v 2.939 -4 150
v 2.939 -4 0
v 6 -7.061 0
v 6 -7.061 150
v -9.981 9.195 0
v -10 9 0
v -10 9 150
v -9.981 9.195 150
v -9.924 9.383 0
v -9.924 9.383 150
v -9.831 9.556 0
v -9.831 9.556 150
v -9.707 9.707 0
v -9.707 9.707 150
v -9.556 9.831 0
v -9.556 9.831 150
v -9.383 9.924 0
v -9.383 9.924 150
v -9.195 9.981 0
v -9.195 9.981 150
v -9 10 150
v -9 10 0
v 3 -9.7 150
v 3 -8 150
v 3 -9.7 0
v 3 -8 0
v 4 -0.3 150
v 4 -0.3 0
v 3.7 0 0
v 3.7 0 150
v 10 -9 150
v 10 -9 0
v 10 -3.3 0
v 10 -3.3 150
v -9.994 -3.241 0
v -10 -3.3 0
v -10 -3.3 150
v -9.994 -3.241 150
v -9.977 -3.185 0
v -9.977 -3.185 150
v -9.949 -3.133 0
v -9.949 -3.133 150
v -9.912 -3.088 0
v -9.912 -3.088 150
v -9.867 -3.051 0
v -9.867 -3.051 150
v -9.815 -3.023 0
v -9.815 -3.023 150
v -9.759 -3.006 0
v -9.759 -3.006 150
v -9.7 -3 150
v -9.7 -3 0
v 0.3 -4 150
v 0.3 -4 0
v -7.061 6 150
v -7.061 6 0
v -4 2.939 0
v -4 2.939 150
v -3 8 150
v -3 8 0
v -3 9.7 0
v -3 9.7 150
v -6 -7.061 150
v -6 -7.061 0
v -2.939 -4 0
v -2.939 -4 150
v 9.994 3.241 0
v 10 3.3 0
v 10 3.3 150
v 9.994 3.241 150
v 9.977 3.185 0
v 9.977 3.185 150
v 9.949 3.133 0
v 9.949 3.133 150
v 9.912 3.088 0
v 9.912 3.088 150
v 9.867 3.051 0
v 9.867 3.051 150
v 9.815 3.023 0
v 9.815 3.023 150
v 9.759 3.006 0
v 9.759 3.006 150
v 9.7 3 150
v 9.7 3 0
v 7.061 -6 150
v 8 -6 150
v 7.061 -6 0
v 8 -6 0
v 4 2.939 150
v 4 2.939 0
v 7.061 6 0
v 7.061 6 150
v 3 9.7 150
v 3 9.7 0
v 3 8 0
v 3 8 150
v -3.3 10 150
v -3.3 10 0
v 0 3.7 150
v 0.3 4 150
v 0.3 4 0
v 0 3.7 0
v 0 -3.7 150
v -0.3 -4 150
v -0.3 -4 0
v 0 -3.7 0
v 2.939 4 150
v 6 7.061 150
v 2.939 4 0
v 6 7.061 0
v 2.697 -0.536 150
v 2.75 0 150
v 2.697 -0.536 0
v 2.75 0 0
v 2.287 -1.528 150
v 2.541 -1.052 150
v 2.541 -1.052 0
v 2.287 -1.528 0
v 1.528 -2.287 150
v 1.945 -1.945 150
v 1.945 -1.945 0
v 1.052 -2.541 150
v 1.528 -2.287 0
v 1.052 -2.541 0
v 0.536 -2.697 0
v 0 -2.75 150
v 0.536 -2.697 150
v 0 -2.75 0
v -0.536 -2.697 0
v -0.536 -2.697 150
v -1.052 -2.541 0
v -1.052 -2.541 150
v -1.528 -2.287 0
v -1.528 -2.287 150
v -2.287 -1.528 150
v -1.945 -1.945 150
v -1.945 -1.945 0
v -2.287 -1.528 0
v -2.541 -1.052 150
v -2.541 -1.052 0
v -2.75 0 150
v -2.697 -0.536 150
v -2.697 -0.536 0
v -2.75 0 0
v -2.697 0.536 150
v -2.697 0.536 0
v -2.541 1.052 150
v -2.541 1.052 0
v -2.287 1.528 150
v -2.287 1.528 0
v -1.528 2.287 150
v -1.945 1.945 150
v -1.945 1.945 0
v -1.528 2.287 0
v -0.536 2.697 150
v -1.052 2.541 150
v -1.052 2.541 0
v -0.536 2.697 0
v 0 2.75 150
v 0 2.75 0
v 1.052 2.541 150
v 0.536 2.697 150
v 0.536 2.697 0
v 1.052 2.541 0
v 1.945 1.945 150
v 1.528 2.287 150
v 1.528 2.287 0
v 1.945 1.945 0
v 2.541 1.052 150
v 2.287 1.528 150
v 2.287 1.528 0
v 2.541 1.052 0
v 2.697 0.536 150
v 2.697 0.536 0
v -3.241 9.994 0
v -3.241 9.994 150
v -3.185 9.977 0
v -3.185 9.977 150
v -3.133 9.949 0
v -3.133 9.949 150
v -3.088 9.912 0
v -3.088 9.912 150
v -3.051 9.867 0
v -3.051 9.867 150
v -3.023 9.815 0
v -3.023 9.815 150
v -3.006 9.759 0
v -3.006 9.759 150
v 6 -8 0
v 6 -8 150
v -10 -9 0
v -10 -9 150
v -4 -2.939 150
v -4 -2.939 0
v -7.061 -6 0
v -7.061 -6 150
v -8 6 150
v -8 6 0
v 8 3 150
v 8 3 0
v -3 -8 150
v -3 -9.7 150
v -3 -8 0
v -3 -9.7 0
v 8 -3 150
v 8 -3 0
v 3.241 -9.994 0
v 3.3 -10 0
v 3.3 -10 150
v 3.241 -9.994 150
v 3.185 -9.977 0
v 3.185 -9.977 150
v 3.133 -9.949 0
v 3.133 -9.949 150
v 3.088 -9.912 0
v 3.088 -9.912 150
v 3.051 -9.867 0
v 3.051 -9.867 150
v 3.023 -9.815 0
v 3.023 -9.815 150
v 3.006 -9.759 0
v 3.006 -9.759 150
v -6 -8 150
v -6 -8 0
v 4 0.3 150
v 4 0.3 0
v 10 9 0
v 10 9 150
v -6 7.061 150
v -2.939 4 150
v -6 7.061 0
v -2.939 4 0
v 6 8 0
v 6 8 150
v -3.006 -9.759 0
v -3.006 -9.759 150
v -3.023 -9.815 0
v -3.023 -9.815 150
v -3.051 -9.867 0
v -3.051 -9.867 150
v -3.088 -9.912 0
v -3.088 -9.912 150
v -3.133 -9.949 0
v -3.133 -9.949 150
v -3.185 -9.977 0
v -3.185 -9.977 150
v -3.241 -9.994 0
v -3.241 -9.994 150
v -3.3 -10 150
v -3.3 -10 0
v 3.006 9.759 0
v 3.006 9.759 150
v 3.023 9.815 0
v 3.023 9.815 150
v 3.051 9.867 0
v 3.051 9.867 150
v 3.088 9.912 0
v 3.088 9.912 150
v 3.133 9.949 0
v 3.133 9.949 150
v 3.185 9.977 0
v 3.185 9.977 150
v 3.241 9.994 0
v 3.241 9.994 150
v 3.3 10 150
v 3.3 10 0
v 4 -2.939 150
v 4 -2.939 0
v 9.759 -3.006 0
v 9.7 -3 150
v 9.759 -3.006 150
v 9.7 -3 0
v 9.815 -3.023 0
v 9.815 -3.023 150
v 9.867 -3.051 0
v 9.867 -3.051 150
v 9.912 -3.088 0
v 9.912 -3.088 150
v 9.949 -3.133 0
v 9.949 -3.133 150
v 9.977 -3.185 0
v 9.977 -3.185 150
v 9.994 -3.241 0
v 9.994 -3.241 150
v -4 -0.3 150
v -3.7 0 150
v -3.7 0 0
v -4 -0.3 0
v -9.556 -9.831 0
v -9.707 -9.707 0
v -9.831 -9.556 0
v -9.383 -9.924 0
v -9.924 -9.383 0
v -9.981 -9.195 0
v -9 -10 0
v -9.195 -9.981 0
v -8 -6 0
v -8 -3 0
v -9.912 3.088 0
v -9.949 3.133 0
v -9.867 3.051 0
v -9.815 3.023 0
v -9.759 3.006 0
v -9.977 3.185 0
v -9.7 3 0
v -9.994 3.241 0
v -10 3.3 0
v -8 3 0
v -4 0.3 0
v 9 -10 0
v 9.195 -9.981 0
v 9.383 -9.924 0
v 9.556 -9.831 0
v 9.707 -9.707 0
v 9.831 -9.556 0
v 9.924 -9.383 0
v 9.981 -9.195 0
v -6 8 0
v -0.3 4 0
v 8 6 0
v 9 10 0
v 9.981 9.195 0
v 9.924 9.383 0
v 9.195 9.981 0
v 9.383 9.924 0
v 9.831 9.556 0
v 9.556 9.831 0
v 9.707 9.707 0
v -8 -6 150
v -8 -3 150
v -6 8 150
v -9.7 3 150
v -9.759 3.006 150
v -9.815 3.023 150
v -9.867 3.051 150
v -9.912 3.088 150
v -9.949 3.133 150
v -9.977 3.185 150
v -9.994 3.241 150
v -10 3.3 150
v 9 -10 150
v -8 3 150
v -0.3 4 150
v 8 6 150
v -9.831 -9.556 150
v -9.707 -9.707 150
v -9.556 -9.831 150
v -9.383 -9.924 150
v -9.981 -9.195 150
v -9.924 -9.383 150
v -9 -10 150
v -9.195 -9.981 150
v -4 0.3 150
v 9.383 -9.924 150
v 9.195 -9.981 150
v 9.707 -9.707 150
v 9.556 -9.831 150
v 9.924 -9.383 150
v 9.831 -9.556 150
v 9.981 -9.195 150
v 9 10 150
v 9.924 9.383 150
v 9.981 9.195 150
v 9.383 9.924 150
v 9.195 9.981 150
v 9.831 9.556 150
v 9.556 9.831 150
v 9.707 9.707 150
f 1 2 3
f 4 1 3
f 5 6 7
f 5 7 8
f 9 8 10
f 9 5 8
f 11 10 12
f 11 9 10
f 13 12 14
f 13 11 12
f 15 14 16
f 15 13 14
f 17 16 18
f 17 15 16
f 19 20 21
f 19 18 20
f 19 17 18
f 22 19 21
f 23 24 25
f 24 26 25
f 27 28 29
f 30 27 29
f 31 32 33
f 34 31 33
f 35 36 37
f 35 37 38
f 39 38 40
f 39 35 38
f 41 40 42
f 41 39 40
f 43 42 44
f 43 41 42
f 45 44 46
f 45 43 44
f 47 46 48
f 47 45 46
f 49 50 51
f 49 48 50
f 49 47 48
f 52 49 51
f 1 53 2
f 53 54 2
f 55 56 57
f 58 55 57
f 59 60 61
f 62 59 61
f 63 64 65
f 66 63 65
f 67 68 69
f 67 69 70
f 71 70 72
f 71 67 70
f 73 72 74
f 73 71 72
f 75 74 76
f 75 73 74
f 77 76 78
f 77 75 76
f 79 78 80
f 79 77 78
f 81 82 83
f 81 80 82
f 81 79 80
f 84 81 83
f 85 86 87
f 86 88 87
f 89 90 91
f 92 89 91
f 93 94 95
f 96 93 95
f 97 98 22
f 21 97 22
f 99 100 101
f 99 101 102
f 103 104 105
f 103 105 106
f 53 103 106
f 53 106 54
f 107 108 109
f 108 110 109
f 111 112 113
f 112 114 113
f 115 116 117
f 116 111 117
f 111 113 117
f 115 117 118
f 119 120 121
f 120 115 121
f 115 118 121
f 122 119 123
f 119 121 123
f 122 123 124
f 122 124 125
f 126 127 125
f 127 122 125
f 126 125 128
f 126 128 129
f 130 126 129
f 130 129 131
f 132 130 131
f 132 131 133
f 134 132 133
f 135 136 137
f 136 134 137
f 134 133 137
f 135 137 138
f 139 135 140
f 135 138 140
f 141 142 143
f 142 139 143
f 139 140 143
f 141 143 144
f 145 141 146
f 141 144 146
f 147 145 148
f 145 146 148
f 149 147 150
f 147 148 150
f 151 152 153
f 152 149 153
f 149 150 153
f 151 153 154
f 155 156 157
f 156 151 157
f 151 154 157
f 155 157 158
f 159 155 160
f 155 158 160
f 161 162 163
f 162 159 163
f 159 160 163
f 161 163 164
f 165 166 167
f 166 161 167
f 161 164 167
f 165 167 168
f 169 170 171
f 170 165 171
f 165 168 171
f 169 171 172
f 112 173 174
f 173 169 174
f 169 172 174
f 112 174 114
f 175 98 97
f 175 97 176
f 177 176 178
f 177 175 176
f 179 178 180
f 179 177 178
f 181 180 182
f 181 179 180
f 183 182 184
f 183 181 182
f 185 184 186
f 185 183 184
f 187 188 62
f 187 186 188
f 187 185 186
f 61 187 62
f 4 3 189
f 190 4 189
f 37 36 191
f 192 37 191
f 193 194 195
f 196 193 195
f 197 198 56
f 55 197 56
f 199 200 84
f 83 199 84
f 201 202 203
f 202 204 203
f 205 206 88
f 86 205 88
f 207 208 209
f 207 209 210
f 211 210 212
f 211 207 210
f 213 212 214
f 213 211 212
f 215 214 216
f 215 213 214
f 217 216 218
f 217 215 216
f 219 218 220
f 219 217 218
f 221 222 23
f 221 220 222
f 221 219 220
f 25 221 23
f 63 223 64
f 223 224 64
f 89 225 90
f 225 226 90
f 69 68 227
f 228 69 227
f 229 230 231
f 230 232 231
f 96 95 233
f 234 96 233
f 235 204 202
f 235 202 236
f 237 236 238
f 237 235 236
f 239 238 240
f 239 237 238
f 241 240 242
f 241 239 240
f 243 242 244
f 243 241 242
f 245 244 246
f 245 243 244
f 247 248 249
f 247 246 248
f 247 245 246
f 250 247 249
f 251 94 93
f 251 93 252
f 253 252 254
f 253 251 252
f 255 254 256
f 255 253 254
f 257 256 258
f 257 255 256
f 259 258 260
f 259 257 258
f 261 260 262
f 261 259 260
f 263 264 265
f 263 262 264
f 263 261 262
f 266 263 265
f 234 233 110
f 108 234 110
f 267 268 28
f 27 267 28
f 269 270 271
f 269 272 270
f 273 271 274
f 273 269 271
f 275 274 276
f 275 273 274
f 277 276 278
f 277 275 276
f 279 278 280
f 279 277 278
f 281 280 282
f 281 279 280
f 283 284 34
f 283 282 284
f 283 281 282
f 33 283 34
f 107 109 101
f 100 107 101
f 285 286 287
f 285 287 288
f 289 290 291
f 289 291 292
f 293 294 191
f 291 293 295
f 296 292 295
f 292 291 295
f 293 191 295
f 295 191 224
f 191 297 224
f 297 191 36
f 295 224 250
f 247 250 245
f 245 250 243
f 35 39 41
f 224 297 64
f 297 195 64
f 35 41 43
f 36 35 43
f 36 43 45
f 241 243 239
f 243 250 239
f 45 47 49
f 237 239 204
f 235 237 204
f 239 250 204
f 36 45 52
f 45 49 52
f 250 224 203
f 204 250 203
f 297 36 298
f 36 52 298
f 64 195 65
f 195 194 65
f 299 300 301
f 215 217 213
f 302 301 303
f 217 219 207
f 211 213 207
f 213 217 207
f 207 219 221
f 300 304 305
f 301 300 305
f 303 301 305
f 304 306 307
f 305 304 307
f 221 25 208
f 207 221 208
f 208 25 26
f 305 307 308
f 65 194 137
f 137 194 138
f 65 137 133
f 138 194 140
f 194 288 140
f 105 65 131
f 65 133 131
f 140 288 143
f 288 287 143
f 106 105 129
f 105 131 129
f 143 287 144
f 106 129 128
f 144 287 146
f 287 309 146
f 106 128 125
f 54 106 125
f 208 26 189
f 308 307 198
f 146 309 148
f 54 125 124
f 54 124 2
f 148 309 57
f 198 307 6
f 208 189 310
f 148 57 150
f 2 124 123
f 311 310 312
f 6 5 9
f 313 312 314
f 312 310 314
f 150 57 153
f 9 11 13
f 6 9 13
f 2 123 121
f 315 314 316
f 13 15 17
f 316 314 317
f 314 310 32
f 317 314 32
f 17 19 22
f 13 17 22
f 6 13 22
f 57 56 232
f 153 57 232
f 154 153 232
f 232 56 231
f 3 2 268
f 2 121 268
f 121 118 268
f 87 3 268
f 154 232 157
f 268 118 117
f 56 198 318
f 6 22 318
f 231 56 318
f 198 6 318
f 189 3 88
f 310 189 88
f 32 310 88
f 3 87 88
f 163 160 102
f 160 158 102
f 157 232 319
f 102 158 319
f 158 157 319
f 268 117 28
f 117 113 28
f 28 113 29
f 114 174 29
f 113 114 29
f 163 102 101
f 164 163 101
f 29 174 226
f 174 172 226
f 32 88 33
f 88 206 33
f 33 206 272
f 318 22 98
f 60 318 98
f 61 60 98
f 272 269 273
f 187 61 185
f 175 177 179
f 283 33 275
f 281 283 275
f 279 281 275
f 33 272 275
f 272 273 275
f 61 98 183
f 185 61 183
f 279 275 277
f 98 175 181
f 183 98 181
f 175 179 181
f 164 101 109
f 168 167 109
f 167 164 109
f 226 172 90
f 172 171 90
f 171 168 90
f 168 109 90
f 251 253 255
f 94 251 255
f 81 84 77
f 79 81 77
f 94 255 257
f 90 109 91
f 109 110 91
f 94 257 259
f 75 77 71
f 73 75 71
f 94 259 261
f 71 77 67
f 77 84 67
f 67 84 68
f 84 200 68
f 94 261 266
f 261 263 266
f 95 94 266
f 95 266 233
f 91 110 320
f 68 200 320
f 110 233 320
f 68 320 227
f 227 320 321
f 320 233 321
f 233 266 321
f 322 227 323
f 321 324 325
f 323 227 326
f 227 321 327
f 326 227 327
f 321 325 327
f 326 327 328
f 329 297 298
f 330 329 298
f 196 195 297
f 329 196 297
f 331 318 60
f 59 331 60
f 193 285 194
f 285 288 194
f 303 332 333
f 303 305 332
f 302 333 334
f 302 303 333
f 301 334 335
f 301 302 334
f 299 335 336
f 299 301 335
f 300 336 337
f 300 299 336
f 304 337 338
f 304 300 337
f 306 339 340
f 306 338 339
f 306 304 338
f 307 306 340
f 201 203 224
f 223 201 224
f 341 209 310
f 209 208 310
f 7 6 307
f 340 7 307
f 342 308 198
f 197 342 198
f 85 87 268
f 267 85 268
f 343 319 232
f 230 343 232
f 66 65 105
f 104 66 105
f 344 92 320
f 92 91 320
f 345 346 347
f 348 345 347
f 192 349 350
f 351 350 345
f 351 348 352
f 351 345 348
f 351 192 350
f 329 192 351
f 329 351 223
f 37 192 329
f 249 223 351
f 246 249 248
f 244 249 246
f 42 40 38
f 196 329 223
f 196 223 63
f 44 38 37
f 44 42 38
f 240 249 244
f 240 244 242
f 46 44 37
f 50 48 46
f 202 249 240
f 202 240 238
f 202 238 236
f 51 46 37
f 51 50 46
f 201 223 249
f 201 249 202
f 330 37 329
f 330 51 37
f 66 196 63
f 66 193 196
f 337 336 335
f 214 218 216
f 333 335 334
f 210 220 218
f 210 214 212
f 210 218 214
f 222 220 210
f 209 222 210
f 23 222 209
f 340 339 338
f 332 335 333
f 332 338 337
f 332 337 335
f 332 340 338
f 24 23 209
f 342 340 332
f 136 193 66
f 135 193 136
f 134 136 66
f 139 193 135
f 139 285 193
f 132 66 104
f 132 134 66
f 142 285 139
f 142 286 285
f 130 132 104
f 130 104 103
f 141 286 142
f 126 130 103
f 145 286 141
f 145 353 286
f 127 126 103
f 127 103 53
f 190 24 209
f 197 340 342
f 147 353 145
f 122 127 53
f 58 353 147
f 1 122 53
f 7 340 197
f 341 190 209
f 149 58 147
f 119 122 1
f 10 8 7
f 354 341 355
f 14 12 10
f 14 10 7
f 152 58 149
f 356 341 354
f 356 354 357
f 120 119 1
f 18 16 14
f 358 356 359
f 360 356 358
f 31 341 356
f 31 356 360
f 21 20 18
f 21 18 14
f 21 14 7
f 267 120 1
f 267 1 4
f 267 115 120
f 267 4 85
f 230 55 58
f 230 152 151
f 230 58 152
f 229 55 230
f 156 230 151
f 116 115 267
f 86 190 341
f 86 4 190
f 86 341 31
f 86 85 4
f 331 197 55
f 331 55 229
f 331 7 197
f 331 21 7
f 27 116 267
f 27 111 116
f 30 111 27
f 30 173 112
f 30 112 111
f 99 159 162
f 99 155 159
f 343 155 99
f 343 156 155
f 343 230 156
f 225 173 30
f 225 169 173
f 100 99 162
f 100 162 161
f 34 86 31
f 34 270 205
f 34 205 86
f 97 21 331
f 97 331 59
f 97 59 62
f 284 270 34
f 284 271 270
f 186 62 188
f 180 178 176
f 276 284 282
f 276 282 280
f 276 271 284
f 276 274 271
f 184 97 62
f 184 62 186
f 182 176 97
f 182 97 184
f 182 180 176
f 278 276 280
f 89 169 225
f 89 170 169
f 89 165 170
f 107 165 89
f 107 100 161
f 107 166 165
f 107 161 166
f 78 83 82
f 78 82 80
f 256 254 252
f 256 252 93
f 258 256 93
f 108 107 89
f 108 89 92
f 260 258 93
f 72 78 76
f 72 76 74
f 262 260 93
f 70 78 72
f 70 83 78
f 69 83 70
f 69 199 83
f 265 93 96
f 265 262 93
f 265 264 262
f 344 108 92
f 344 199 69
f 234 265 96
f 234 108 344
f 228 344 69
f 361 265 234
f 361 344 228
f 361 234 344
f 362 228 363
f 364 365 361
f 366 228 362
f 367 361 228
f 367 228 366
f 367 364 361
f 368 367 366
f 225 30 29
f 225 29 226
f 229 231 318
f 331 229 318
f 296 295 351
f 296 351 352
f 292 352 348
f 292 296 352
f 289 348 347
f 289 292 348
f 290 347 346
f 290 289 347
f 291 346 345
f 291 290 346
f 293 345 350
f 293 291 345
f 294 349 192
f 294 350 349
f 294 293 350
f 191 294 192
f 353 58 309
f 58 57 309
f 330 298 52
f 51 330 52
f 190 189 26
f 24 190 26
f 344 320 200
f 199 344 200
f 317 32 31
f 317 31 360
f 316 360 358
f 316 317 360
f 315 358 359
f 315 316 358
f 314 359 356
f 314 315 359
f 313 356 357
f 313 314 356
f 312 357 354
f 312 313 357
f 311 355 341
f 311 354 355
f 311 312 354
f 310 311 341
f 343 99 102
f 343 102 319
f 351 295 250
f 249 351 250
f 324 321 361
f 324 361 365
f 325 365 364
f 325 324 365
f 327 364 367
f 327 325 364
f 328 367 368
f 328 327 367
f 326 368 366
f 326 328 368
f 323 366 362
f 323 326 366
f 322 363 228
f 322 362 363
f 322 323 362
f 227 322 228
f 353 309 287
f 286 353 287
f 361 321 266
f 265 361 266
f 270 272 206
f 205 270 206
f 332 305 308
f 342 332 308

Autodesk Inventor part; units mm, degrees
ref_plane "Startebene" through (0, 0, 0) normal (0, 0, 1) x (1, 0, 0)
ref_plane "Endebene" through (0, 0, 320) normal (0, 0, 1) x (1, 0, 0)
ref_plane "Startebene1" through (0, 0, 0) normal (0, 0, 1) x (1, 0, 0)
ref_plane "Endebene1" through (0, 0, 160) normal (0, 0, 1) x (1, 0, 0)
ref_plane "Startebene2" through (0, 0, 0) normal (0, 0, 1) x (1, 0, 0)
ref_plane "Endebene2" through (0, 0, 150) normal (0, 0, 1) x (1, 0, 0)
sketch "Skizze" plane through (0, 0, 0) normal (0, 0, 1) x (1, 0, 0)
  line L0 (-10, 9) -> (-10, 3.3)
  arc A0 (-10, 3.3) -> (-9.7, 3) centre (-9.7, 3.3) ccw
  line L1 (-9.7, 3) -> (-8, 3)
  line L2 (-8, 3) -> (-8, 6)
  line L3 (-8, 6) -> (-7.0607, 6)
  line L4 (-7.0607, 6) -> (-4, 2.9393)
  line L5 (-4, 2.9393) -> (-4, 0.3)
  line L6 (-4, 0.3) -> (-3.7, 0)
  line L7 (-3.7, 0) -> (-4, -0.3)
  line L8 (-4, -0.3) -> (-4, -2.9393)
  line L9 (-4, -2.9393) -> (-7.0607, -6)
  line L10 (-7.0607, -6) -> (-8, -6)
  line L11 (-8, -6) -> (-8, -3)
  line L12 (-8, -3) -> (-9.7, -3)
  arc A1 (-9.7, -3) -> (-10, -3.3) centre (-9.7, -3.3) ccw
  line L13 (-10, -3.3) -> (-10, -9)
  arc A2 (-10, -9) -> (-9, -10) centre (-9, -9) ccw
  line L14 (-9, -10) -> (-3.3, -10)
  arc A3 (-3.3, -10) -> (-3, -9.7) centre (-3.3, -9.7) ccw
  line L15 (-3, -9.7) -> (-3, -8)
  line L16 (-3, -8) -> (-6, -8)
  line L17 (-6, -8) -> (-6, -7.0607)
  line L18 (-6, -7.0607) -> (-2.9393, -4)
  line L19 (-2.9393, -4) -> (-0.3, -4)
  line L20 (-0.3, -4) -> (0, -3.7)
  line L21 (0, -3.7) -> (0.3, -4)
  line L22 (0.3, -4) -> (2.9393, -4)
  line L23 (2.9393, -4) -> (6, -7.0607)
  line L24 (6, -7.0607) -> (6, -8)
  line L25 (6, -8) -> (3, -8)
  line L26 (3, -8) -> (3, -9.7)
  arc A4 (3, -9.7) -> (3.3, -10) centre (3.3, -9.7) ccw
  line L27 (3.3, -10) -> (9, -10)
  arc A5 (9, -10) -> (10, -9) centre (9, -9) ccw
  line L28 (10, -9) -> (10, -3.3)
  arc A6 (10, -3.3) -> (9.7, -3) centre (9.7, -3.3) ccw
  line L29 (9.7, -3) -> (8, -3)
  line L30 (8, -3) -> (8, -6)
  line L31 (8, -6) -> (7.0607, -6)
  line L32 (7.0607, -6) -> (4, -2.9393)
  line L33 (4, -2.9393) -> (4, -0.3)
  line L34 (4, -0.3) -> (3.7, 0)
  line L35 (3.7, 0) -> (4, 0.3)
  line L36 (4, 0.3) -> (4, 2.9393)
  line L37 (4, 2.9393) -> (7.0607, 6)
  line L38 (7.0607, 6) -> (8, 6)
  line L39 (8, 6) -> (8, 3)
  line L40 (8, 3) -> (9.7, 3)
  arc A7 (9.7, 3) -> (10, 3.3) centre (9.7, 3.3) ccw
  line L41 (10, 3.3) -> (10, 9)
  arc A8 (10, 9) -> (9, 10) centre (9, 9) ccw
  line L42 (9, 10) -> (3.3, 10)
  arc A9 (3.3, 10) -> (3, 9.7) centre (3.3, 9.7) ccw
  line L43 (3, 9.7) -> (3, 8)
  line L44 (3, 8) -> (6, 8)
  line L45 (6, 8) -> (6, 7.0607)
  line L46 (6, 7.0607) -> (2.9393, 4)
  line L47 (2.9393, 4) -> (0.3, 4)
  line L48 (0.3, 4) -> (0, 3.7)
  line L49 (0, 3.7) -> (-0.3, 4)
  line L50 (-0.3, 4) -> (-2.9393, 4)
  line L51 (-2.9393, 4) -> (-6, 7.0607)
  line L52 (-6, 7.0607) -> (-6, 8)
  line L53 (-6, 8) -> (-3, 8)
  line L54 (-3, 8) -> (-3, 9.7)
  arc A10 (-3, 9.7) -> (-3.3, 10) centre (-3.3, 9.7) ccw
  line L55 (-3.3, 10) -> (-9, 10)
  arc A11 (-9, 10) -> (-10, 9) centre (-9, 9) ccw
  circle A12 centre (0, 0) radius 2.75
  dimension "d2" = 5.5
  dimension "d3" = 10
  dimension "d4" = 10
  dimension "d5" = 5.7
  dimension "d6" = 5.7
  dimension "d7" = 1.7
  dimension "d8" = 3
  dimension "d9" = 0.3
  dimension "d10" = 90
  dimension "d11" = 45
  dimension "d12" = 45
  dimension "d13" = 45
  dimension "d14" = 90
  dimension "d15" = 90
  dimension "d16" = 45
  dimension "d17" = 45
  dimension "d18" = 45
  dimension "d19" = 45
  dimension "d20" = 90
  dimension "d21" = 90
  dimension "d22" = 45
  dimension "d23" = 45
  dimension "d24" = 90
  dimension "d25" = 90
  dimension "d26" = 90
  dimension "d27" = 90
  dimension "d28" = 90
  dimension "d29" = 90
  dimension "d30" = 90
  dimension "d31" = 90
  dimension "d32" = 90
  dimension "d33" = 90
  dimension "d34" = 90
  dimension "d35" = 90
  dimension "d36" = 90
  dimension "d37" = 90
  dimension "d38" = 90
  dimension "d39" = 4
  dimension "d40" = 6
  dimension "d41" = 13
  dimension "d42" = 14
  dimension "d43" = 16
  dimension "d44" = 18
  dimension "d45" = 3
  dimension "d46" = 9
  dimension "d47" = 7
  dimension "d48" = 1
  dimension "d49" = 7
  dimension "d50" = 1.5
  dimension "d51" = 1.8663
  dimension "d52" = 3.3663
  dimension "d53" = 1.5
  dimension "d54" = 1.8663
  dimension "d55" = 3.3663
  dimension "d56" = 4
  dimension "d57" = 10.8187
  dimension "d58" = 1.9092
  dimension "d59" = 5
  dimension "d60" = 13
  dimension "d61" = 13
  dimension "d62" = 16.0513
  dimension "d63" = 3.3234
  dimension "d64" = 14
  dimension "d65" = 12.685
extrude "Körper" add sketch "Skizze" along normal up to surface (150 mm away) from surface at 0
sketch "Skizze13" plane through (0, 0, 0) normal (0, 0, 1) x (1, 0, 0)
  line L0 (0, 0) -> (10, 0)
ref_plane "Arbeitsebene12" through (0, 0, 0) normal (0, -1, 0) x (1, 0, 0)
sketch "Skizze14" plane through (0, 0, 0) normal (0, -1, 0) x (1, 0, 0)
  line L0 (-2, 0) -> (12, 0)
  line L1 (-2, 150) -> (12, 150)
  dimension "d80" = 150
ref_plane "Arbeitsebene13" through (80, 9, 150) normal (0, 0, 1) x (1, 0, 0)
split "Trennen1" plane through (80, 9, 150) removes the side toward (0, 0, 1)
equation "\"G_OFFSET_START\" = 0"
equation "\"G_OFFSET_END\" = 0"
equation "\"G_L\" = d80"
equation "\"G_OFFSET_START1\" = 0"
equation "\"G_OFFSET_END1\" = 0"
equation "\"G_OFFSET_START2\" = 0"
properties part number "Alu Profil 20x20 - AP2020" material "Aluminium 6061"
